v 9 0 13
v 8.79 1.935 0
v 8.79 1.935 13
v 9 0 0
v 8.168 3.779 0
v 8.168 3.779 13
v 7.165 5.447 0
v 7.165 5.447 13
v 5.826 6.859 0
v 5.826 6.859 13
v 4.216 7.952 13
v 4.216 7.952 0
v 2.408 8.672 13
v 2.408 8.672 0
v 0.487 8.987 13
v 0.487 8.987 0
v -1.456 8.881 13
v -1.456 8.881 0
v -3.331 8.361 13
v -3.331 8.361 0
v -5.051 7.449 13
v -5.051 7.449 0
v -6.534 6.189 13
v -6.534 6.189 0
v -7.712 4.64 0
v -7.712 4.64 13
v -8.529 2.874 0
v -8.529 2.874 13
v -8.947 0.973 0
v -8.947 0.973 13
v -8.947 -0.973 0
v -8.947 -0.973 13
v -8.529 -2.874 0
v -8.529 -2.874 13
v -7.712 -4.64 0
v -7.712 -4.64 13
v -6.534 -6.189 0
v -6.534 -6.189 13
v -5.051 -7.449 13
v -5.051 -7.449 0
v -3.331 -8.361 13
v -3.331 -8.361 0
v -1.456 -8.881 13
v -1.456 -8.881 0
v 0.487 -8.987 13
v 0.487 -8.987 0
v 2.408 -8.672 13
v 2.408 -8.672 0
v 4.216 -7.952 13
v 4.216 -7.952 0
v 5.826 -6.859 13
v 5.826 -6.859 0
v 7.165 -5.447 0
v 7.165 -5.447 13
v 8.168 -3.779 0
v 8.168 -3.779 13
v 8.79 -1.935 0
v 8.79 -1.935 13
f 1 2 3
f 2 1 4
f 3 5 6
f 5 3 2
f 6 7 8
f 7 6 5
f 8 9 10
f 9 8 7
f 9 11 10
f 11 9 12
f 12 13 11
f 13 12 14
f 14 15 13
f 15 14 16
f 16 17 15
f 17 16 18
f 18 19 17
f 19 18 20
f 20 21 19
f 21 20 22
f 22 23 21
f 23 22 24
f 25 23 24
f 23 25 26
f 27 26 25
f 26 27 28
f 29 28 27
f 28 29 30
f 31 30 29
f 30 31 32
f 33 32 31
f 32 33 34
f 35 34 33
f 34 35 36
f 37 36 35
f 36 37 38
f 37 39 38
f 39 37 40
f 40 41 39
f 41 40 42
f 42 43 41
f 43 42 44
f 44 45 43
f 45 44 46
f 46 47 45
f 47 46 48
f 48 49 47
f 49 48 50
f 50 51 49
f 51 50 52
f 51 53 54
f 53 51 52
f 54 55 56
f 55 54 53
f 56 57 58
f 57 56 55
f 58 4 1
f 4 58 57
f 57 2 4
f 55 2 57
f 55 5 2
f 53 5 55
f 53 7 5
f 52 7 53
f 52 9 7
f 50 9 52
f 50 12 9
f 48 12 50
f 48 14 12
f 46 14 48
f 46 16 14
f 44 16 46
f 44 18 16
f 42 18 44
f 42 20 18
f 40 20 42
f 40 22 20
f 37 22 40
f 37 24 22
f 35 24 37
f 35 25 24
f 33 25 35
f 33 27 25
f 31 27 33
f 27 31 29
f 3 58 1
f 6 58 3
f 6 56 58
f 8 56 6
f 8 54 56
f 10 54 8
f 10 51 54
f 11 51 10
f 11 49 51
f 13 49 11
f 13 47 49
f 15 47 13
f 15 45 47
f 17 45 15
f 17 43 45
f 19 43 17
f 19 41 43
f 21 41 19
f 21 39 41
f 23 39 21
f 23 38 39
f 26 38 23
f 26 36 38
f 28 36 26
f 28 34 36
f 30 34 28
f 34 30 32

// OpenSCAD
// Generated by SolidPython 1.0.1 on 2020-07-29 00:46:44


cylinder(h = 13, r1 = 9, r2 = 9);
/***********************************************
*********      SolidPython code:      **********
************************************************
 
# import packages: SolidPython
from solid import *
from solid.utils import *
from itertools import chain, combinations, permutations


class Resize:

    def __init__(self, scad_file):
        self.scad_file = scad_file
        #self.scad_file = import_scad(scad_file)
        # cone/cylinder param:
        self.r1 = 0
        self.r2 = 0
        self.h = 0
        # rectangular prism param:
        self.w = 0
        self.l = 0
        # ellipse param:
        self.r = 0

    # import OpenScad code (file name corresponds to shape)


    # classify shape + parameters
    def assign(self, param1, param2, param3):
        if self.scad_file == 'cone.scad':
            self.r1 = param1
            self.r2 = param2
            self.h = param3
        elif self.scad_file == 'cylinder.scad':
            self.r1 = param1
            self.r2 = param2
            self.h = param3
        elif self.scad_file == 'rectangularPrism.scad':
            self.h = param1
            self.l = param2
            self.w = param3
        else:
            self.r = param1
            self.h = param2

    # resize parameters
    def iterate(self):
        x = range(3, 20, 2)
        i = 1
        if self.scad_file == 'cone.scad':
            tempList = list(permutations(x, 2))
            for temp in tempList:
                param1 = temp[0]
                param2 = temp[1]
                filepath = 'produced_scad_files/' + 'cone' + str(param1) + '_' + str(param2) + '_' + '.scad'
                scad_render_to_file(cylinder(h=param1, r1=param2, r2=0), filepath)

        elif self.scad_file == 'cylinder.scad':
            tempList = list(permutations(x, 3))
            for temp in tempList:
                param1 = temp[0]
                param2 = temp[1]
                filepath = 'produced_scad_files/' + 'cylinder' + str(param1) + '_' + str(param2) + '_' + '.scad'
                scad_render_to_file(cylinder(h=param1, r1=param2, r2=param2), filepath)

        elif self.scad_file == 'rectangularPrism.scad':
            tempList = list(permutations(x, 3))
            for temp in tempList:
                param1 = temp[0]
                param2 = temp[1]
                param3 = temp[2]
                filepath = 'produced_scad_files/' + 'rectangularPrism' + str(param1) + '_' + str(param2) + '_' + str(
                    param3) + '.scad'
                scad_render_to_file(cube(size=(param1, param2, param3)), filepath)

        elif self.scad_file == 'ellipse.scad':
            tempList = list(permutations(x, 4))
            for temp in tempList:
                param1 = temp[0]
                param2 = temp[1]
                param3 = temp[2]
                param4 = temp[3]
                filepath = 'produced_scad_files/' + 'ellipse' + str(param1) + '_' + str(param2) + '_' + str(param3) + '_' + str(param4) + '.scad'
                scad_render_to_file(scale([param1, param2, param3])(sphere(r=param4)), filepath)

    def render_to_scadfile(self):
        scad_render_to_file(scad, 'example.scad') 
 
************************************************/
